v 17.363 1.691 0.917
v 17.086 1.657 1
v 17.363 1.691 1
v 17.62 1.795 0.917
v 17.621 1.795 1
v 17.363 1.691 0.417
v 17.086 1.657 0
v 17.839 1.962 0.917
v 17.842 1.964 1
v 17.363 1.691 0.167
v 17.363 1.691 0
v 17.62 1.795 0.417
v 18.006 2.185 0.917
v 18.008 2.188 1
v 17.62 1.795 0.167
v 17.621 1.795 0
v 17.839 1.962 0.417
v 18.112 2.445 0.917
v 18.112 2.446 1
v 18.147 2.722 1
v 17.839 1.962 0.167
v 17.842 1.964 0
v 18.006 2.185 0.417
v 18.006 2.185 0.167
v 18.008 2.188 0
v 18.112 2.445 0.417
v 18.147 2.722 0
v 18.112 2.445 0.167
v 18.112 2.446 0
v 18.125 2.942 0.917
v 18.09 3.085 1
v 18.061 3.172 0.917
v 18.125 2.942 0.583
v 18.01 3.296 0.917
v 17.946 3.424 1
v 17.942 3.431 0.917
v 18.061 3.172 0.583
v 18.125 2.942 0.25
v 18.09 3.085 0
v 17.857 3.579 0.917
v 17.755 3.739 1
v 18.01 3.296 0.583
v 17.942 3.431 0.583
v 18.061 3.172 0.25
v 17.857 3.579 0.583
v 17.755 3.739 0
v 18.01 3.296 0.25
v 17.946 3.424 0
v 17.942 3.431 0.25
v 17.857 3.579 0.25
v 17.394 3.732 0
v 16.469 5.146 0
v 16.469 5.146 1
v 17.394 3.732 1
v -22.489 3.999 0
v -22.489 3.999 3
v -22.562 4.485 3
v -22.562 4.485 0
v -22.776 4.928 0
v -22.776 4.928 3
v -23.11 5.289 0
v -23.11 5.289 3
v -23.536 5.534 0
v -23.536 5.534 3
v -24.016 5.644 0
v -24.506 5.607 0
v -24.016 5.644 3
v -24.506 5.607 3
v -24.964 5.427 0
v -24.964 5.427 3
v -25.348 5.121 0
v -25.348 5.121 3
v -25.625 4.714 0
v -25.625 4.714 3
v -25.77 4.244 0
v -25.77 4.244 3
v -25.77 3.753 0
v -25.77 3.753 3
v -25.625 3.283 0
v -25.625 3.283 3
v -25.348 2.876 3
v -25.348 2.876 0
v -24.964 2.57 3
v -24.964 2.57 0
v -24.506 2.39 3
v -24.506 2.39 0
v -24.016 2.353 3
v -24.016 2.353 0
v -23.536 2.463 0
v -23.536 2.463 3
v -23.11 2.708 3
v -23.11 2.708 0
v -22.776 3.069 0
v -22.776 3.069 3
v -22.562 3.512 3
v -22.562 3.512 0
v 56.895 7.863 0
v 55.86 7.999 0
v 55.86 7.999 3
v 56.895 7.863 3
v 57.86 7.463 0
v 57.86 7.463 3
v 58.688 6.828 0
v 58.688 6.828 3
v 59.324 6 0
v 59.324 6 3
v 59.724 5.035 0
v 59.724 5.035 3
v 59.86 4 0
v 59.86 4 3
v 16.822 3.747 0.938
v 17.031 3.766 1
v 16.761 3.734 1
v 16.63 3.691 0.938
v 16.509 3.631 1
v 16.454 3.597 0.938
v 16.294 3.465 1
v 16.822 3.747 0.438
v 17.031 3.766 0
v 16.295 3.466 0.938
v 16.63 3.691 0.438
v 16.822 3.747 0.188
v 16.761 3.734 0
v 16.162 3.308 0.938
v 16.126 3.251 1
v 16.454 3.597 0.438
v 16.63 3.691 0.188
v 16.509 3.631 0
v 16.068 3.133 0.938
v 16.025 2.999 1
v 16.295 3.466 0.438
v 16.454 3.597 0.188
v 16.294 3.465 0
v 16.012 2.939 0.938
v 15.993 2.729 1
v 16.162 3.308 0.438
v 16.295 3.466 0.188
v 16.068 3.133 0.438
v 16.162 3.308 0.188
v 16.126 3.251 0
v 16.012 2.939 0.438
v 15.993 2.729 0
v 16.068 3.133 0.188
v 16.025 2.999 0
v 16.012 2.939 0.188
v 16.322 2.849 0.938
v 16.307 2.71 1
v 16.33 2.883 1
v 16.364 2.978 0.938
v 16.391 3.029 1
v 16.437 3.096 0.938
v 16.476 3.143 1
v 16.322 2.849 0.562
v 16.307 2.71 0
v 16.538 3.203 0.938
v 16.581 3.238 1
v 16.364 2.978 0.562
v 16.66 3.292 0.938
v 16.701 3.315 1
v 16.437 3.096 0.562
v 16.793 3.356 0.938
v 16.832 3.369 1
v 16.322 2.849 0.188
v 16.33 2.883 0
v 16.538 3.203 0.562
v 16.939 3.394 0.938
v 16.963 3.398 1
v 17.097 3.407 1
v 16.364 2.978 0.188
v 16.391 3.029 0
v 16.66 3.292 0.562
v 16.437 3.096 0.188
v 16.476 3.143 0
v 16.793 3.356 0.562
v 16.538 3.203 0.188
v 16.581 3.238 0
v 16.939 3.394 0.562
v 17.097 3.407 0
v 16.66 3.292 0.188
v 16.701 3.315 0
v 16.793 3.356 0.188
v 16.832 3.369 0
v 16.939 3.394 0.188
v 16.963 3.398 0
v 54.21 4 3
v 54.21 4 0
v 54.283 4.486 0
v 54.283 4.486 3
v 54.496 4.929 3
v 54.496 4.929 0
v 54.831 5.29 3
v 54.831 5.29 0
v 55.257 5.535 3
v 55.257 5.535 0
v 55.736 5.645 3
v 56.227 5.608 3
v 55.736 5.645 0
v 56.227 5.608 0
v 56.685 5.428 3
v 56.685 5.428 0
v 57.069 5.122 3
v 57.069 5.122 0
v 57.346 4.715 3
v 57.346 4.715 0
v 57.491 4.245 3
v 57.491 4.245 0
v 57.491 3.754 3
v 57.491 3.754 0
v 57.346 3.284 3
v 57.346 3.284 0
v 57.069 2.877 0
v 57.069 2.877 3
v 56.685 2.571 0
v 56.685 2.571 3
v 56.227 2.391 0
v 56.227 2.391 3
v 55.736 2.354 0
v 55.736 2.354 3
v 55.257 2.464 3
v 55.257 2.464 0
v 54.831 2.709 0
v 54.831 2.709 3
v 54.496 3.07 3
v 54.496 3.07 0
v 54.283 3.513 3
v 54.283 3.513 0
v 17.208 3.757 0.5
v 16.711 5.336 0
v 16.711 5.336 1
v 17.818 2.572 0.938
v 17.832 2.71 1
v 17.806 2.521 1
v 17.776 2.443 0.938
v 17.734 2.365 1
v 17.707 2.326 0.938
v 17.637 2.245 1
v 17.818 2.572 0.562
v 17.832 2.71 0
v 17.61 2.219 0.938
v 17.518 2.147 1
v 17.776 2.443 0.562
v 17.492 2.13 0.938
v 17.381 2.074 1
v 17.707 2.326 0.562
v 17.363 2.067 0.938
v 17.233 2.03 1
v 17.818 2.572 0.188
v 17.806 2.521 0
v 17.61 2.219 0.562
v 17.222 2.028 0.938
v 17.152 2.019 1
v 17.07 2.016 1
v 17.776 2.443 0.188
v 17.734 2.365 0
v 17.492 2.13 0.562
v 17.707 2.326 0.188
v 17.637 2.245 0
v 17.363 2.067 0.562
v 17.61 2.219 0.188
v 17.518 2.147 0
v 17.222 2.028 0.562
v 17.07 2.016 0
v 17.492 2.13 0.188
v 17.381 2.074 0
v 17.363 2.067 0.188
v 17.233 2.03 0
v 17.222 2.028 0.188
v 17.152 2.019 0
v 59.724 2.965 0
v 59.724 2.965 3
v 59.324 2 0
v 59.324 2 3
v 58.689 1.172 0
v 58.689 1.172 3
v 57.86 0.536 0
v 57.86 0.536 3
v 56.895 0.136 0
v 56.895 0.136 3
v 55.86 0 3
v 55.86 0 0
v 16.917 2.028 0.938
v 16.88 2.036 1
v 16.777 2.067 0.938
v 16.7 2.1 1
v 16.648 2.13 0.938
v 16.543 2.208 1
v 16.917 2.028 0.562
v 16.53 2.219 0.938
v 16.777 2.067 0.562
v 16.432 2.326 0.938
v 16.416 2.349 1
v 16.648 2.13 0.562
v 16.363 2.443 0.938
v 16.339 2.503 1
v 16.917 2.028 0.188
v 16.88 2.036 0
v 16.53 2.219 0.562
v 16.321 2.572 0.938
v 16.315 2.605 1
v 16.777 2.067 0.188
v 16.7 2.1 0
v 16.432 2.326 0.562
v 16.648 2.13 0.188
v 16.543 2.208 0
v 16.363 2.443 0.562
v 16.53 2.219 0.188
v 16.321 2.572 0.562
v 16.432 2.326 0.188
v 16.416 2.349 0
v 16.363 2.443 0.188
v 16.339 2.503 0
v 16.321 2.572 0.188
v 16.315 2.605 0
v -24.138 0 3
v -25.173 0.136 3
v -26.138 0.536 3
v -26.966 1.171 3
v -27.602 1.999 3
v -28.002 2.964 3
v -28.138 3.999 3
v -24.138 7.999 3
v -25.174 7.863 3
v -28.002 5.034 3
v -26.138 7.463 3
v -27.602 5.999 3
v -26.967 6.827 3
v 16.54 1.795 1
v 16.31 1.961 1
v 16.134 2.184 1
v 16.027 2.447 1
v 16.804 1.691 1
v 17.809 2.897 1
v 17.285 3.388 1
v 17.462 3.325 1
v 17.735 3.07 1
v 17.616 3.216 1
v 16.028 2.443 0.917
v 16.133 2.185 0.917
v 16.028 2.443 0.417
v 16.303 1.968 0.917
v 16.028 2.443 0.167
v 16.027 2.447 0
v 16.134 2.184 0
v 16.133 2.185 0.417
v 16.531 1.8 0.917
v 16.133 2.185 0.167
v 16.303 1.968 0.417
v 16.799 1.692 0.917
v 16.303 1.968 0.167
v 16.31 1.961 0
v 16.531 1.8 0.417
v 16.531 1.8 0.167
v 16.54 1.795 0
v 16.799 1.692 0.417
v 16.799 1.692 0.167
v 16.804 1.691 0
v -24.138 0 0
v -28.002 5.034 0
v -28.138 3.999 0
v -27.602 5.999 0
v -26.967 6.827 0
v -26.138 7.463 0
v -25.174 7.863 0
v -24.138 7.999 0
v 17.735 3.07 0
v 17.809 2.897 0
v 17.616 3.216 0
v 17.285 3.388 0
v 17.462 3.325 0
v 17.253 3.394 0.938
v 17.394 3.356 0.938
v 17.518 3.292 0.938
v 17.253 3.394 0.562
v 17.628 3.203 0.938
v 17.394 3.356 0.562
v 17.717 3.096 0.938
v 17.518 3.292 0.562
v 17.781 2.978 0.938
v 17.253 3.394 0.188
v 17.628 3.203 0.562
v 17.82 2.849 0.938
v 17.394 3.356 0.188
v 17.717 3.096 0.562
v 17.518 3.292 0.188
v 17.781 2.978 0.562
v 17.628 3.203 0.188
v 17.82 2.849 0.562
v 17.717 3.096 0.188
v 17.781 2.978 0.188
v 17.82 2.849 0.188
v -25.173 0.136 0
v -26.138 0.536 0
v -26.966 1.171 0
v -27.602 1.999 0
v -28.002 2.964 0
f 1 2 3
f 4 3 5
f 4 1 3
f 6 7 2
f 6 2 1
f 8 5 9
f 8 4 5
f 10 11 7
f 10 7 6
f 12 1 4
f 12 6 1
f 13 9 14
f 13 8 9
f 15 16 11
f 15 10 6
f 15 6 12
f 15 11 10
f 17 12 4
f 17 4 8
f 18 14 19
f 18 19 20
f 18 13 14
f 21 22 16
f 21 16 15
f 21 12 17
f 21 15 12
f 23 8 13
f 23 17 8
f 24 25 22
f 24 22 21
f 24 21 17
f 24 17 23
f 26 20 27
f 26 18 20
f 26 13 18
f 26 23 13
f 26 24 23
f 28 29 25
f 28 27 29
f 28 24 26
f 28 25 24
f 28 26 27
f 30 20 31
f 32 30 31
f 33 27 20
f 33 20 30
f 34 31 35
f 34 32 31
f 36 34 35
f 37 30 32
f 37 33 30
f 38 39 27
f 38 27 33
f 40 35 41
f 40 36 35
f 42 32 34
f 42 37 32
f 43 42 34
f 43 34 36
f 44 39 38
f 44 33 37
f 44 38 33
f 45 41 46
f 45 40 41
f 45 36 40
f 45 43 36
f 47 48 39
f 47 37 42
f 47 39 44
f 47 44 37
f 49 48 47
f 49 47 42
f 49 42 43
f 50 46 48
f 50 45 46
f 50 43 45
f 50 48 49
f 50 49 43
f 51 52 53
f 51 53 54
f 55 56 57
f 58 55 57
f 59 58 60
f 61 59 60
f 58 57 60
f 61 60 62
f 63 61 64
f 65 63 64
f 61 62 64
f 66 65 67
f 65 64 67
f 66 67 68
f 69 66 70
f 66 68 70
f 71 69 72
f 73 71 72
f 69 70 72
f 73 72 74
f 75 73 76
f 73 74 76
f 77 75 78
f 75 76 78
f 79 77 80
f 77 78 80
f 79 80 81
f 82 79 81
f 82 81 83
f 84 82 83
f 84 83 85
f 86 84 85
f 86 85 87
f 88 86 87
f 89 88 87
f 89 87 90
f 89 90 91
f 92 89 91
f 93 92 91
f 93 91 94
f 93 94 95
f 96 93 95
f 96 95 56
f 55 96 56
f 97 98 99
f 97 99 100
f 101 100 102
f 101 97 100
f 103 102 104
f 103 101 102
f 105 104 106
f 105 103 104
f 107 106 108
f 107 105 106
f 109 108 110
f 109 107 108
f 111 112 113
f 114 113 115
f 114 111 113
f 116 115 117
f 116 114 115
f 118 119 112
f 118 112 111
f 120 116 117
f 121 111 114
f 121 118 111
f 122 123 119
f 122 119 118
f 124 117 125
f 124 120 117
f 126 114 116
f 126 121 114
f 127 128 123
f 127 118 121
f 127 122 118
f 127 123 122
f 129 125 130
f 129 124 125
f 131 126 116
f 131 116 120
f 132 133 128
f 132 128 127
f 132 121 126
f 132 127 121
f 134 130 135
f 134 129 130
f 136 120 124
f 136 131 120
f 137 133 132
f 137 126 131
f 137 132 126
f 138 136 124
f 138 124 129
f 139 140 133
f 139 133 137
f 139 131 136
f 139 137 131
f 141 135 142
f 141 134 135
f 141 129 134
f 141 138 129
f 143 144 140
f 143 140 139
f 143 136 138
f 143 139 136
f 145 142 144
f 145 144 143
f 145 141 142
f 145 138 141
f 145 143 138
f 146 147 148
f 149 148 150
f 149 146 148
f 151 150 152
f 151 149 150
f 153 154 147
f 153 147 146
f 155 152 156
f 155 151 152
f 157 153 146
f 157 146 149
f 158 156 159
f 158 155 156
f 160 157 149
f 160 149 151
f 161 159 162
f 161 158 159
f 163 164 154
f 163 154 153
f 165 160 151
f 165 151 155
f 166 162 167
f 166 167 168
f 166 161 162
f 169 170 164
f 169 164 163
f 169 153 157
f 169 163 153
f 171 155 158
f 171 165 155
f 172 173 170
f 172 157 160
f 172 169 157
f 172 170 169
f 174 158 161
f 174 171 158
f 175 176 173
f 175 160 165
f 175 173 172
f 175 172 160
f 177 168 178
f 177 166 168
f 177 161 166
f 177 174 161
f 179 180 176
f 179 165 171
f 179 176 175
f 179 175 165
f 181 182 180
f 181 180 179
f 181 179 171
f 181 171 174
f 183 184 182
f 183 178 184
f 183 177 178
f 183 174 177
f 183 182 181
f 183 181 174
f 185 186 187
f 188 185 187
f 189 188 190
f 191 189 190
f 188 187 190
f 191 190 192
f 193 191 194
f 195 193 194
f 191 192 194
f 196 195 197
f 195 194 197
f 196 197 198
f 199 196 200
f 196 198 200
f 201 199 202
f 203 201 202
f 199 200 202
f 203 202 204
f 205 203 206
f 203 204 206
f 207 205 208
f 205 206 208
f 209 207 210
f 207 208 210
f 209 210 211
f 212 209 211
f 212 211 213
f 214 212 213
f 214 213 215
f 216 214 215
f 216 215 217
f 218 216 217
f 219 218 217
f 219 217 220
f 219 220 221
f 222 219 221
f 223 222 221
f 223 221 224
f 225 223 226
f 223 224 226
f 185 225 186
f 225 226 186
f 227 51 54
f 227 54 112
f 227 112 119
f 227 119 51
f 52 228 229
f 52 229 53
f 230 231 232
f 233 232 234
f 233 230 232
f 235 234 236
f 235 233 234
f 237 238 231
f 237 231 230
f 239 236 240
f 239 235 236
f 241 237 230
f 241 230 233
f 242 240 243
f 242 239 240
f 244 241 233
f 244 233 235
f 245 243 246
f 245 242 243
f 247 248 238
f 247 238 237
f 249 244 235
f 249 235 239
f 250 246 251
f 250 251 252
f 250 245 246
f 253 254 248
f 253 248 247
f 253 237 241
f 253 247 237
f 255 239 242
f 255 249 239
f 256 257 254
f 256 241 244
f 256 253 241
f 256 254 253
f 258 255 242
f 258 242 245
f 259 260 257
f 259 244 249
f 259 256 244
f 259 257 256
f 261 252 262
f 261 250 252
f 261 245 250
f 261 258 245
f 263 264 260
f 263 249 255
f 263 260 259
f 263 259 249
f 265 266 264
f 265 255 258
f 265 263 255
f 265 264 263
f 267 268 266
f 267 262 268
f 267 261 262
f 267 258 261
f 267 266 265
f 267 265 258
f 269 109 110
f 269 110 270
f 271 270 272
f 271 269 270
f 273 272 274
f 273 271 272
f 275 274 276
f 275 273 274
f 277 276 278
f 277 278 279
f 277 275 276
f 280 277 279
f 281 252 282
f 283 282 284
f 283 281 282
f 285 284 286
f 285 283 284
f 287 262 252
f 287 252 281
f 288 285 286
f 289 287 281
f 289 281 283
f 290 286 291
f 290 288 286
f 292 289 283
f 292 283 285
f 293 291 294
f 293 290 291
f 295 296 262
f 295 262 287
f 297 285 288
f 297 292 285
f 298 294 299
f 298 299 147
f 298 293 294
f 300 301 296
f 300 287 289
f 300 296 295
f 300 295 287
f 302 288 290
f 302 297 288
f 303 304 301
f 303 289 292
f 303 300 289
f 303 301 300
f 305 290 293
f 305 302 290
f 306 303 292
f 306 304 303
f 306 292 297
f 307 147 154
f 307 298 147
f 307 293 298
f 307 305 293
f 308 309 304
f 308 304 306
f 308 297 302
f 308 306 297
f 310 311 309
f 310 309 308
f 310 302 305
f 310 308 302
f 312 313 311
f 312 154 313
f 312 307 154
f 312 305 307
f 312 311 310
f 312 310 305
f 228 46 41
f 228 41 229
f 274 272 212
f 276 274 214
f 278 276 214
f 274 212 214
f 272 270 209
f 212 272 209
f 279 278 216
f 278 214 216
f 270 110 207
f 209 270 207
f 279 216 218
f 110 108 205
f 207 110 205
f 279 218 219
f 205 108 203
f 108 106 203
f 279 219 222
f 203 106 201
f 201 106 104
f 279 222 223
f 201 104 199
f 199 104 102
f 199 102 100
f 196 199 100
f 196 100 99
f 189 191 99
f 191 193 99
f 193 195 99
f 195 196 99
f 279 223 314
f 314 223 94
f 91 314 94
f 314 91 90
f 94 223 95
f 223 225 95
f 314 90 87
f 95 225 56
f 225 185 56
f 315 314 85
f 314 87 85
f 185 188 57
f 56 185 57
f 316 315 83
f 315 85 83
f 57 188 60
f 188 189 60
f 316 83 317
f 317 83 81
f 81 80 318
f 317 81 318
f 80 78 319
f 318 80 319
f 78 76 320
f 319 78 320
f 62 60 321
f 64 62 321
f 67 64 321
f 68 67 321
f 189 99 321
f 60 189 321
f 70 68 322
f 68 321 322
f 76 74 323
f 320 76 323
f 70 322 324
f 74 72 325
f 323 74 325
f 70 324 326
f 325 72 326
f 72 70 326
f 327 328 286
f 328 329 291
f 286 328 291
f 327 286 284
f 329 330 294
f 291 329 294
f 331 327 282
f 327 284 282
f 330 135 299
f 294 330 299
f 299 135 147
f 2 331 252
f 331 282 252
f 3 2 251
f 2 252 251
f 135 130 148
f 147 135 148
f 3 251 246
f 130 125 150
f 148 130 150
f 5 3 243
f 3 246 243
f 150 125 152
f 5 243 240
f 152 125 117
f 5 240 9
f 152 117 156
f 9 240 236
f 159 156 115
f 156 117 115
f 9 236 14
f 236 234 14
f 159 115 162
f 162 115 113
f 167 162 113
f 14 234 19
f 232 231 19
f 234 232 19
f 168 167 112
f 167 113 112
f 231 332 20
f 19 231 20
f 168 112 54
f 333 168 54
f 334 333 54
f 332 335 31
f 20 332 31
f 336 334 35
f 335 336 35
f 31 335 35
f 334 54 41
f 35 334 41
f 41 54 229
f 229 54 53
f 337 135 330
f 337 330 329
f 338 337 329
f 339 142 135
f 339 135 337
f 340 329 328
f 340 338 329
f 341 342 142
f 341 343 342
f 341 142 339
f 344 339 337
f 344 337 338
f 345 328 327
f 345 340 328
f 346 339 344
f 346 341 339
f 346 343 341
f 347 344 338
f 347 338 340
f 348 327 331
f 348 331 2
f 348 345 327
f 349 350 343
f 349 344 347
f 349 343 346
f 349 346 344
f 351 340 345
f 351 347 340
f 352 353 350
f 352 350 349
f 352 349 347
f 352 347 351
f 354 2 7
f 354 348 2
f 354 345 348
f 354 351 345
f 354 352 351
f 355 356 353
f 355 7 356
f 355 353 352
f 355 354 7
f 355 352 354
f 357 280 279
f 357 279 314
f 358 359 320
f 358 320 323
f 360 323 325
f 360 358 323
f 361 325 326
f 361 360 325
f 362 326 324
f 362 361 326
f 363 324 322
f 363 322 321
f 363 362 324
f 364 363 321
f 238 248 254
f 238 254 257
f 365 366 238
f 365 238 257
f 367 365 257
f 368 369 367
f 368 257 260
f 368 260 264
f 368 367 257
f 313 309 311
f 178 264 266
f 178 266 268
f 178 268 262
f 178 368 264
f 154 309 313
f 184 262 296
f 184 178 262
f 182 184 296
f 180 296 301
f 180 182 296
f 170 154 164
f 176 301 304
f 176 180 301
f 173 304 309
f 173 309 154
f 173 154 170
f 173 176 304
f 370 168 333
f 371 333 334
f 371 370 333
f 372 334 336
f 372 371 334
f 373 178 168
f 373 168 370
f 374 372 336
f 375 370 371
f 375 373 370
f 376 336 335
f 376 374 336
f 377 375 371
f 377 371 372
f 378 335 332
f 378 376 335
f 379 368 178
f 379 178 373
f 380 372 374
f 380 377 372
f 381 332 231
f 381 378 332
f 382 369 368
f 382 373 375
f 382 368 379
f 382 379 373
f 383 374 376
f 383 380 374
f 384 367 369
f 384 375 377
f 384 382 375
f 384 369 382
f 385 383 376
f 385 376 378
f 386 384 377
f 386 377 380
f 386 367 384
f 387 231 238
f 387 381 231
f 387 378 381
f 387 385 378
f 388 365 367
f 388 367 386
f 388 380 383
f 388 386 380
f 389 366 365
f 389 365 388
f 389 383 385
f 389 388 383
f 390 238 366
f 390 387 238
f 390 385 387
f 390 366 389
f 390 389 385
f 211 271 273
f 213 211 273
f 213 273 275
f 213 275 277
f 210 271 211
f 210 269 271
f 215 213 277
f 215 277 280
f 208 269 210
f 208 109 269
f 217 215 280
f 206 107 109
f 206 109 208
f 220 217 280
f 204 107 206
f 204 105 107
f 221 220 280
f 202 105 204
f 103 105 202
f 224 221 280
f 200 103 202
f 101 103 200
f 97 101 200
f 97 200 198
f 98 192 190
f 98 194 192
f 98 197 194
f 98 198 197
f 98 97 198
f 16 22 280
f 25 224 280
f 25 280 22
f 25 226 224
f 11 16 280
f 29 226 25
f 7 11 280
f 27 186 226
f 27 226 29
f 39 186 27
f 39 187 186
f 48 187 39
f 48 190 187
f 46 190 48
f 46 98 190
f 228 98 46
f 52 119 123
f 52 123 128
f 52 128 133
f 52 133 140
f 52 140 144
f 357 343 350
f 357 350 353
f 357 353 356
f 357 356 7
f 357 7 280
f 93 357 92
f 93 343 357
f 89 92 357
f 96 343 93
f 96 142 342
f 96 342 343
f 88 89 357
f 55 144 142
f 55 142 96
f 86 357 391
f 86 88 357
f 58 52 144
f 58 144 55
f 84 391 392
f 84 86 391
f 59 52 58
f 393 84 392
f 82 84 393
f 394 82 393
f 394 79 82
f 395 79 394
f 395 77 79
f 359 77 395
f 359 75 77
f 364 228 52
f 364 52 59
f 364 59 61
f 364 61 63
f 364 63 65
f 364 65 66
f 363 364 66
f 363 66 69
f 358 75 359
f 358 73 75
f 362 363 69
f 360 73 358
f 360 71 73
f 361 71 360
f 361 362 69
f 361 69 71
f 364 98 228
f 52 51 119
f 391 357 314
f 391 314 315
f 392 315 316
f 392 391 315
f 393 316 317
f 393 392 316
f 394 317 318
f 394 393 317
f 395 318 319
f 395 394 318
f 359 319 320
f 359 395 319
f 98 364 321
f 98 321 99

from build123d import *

# Parameters (mm, degrees)
SKETCH_1_R          = 1.3
SKETCH_1_R_2        = 1.65
EXTRUDE_1_DEPTH     = 3
SKETCH_2_R          = 1.65
CUT_EXTRUDE_1_DEPTH = 61.466769186
CUT_EXTRUDE_2_DEPTH = 1


with BuildPart() as part:
    # 草图1 → 凸台-拉伸1 (new body)
    with BuildSketch(Plane(origin=(0, 0, 0), x_dir=(-1, 0, 0), z_dir=(0, 0, -1))):
        with BuildLine():
            Line((-55.860221974, 0), (24.13832066, 0))
            ThreePointArc((24.13832066, 0), (26.966394209, 1.171219344), (28.138320535, 3.999))
            ThreePointArc((28.138320535, 3.999), (26.96674766, 6.827427125), (24.138320535, 7.999))
            Line((24.138320535, 7.999), (-55.860222099, 7.999))
            ThreePointArc((-55.860222099, 7.999), (-58.688295648, 6.827780656), (-59.860221974, 4))
            ThreePointArc((-59.860221974, 4), (-58.688649099, 1.171572875), (-55.860221974, 0))
        make_face()
        with Locations((24.138809001, 3.998511534)):
            Circle(SKETCH_1_R, mode=Mode.SUBTRACT)
        with Locations((-55.859733508, 3.999511534)):
            Circle(SKETCH_1_R_2, mode=Mode.SUBTRACT)
    extrude(amount=-EXTRUDE_1_DEPTH)

    # 草图2 → 切除-拉伸1 (cut, through all)
    with BuildSketch(Plane.XY.offset(3)):
        with Locations((-24.138809001, 3.998511534)):
            Circle(SKETCH_2_R)
    extrude(amount=-CUT_EXTRUDE_1_DEPTH, mode=Mode.SUBTRACT)

    # 草图3 → 切除-拉伸2 (cut)
    with BuildSketch(Plane(origin=(0, 0, 0), x_dir=(-1, 0, 0), z_dir=(0, 0, -1))):
        with BuildLine():
            Line((-16.710668713, 5.336154662), (-16.468781693, 5.146150656))
            Line((-16.468781693, 5.146150656), (-17.393561341, 3.731987996))
            add(Edge.make_bspline(
                [(-17.393561341, 3.731987996), (-17.331991064, 3.741801856), (-17.211891277, 3.760944901), (-17.090325379, 3.764102847), (-17.031081373, 3.765641842)],
                knots=[0, 0, 0, 0, 1.025318673, 2, 2, 2, 2], degree=3))
            add(Edge.make_bspline(
                [(-17.031081373, 3.765641842), (-16.995508877, 3.76468573), (-16.925485476, 3.762803653), (-16.822678674, 3.748319802), (-16.723889738, 3.72549469), (-16.629528126, 3.692222434), (-16.539255144, 3.64972008), (-16.452552748, 3.59878121), (-16.371050738, 3.536775529), (-16.293699558, 3.467510573), (-16.223472461, 3.390793589), (-16.161296405, 3.309392252), (-16.109069614, 3.223391371), (-16.066695692, 3.132834505), (-16.033790813, 3.037861246), (-16.009803168, 2.938593106), (-15.995623576, 2.834961635), (-15.993698085, 2.76448346), (-15.992719995, 2.728682707)],
                knots=[0, 0, 0, 0, 1.04369286, 2.054478336, 3.041073146, 4.015093852, 4.984733326, 5.965804835, 6.960378782, 7.985147595, 9.009457201, 10.008161701, 10.986880575, 11.956520048, 12.937015923, 13.931873656, 14.949455224, 16, 16, 16, 16], degree=3))
            add(Edge.make_bspline(
                [(-15.992719995, 2.728682707), (-15.9941431, 2.679703003), (-15.996943433, 2.583322537), (-16.024847229, 2.442945831), (-16.068206874, 2.309213315), (-16.130184402, 2.184260144), (-16.207166785, 2.068257574), (-16.301044378, 1.965472109), (-16.408487866, 1.873802072), (-16.529974665, 1.797145453), (-16.660717629, 1.734542402), (-16.798069626, 1.689577159), (-16.940696772, 1.66189369), (-17.03750138, 1.658423087), (-17.086469995, 1.656667483)],
                knots=[0, 0, 0, 0, 1.031375318, 2.029502543, 3.004789286, 3.987476834, 4.960371455, 5.9300674, 6.912260825, 7.929083631, 8.949397511, 9.960523116, 10.96833055, 12, 12, 12, 12], degree=3))
            add(Edge.make_bspline(
                [(-17.086469995, 1.656667483), (-17.133566695, 1.658195689), (-17.226857013, 1.661222797), (-17.364089808, 1.688188735), (-17.495952825, 1.731895837), (-17.621522206, 1.792110116), (-17.737842819, 1.868167999), (-17.841908455, 1.959730278), (-17.93320023, 2.064839743), (-18.009174851, 2.18348009), (-18.069433583, 2.310970048), (-18.114623508, 2.443907204), (-18.141019751, 2.581807186), (-18.144708308, 2.675288325), (-18.146566149, 2.722372611)],
                knots=[0, 0, 0, 0, 1.012016664, 2.004627821, 2.994792927, 3.992885782, 4.990978636, 5.973936114, 6.964471063, 7.975201453, 8.993600317, 9.990122807, 10.98767138, 12, 12, 12, 12], degree=3))
            add(Edge.make_bspline(
                [(-18.146566149, 2.722372611), (-18.145384704, 2.758417194), (-18.142972419, 2.832013346), (-18.126129028, 2.943477374), (-18.099064233, 3.057528456), (-18.068753987, 3.15428265), (-18.036728377, 3.233544172), (-18.010075837, 3.297447662), (-17.976901841, 3.363208735), (-17.94152846, 3.433082371), (-17.900771591, 3.505267804), (-17.856455942, 3.580971474), (-17.807356291, 3.658989401), (-17.772936128, 3.711933596), (-17.755340187, 3.738999214)],
                knots=[0, 0, 0, 0, 1.173818275, 2.396712641, 3.66331629, 4.989737886, 5.693666774, 6.447286557, 7.243889047, 8.091586357, 8.998013824, 9.943181721, 10.948533338, 12, 12, 12, 12], degree=3))
            Line((-17.755340187, 3.738999214), (-16.710668713, 5.336154662))
        make_face()
        with BuildLine():
            add(Edge.make_bspline(
                [(-17.096986822, 3.406667483), (-17.123649066, 3.405889439), (-17.175728176, 3.404369694), (-17.252135591, 3.395544442), (-17.324448842, 3.378925376), (-17.393625976, 3.357759044), (-17.458373679, 3.328655985), (-17.519162518, 3.293304186), (-17.57622757, 3.251683008), (-17.628971122, 3.204382096), (-17.676790785, 3.152594064), (-17.717971916, 3.097124541), (-17.753494316, 3.039310338), (-17.782376135, 2.978668396), (-17.804866211, 2.915221896), (-17.821134462, 2.849262647), (-17.830188213, 2.780348341), (-17.831694444, 2.733615838), (-17.832463584, 2.709752419)],
                knots=[0, 0, 0, 0, 1.129588631, 2.206414736, 3.251139165, 4.268635594, 5.265702196, 6.250456724, 7.242448911, 8.251968645, 9.246821453, 10.222880186, 11.173611482, 12.116736599, 13.062300278, 14.020270554, 14.989073742, 16, 16, 16, 16], degree=3))
            add(Edge.make_bspline(
                [(-17.832463584, 2.709752419), (-17.831837223, 2.686102439), (-17.830609021, 2.639728349), (-17.819456701, 2.57138917), (-17.802421619, 2.505624261), (-17.777081223, 2.442772662), (-17.746854335, 2.381876344), (-17.706949011, 2.325141059), (-17.662732225, 2.269120989), (-17.609878292, 2.218119517), (-17.553154929, 2.170662893), (-17.492553726, 2.12918264), (-17.429393766, 2.093696466), (-17.362822344, 2.065885369), (-17.29378396, 2.043061082), (-17.221703406, 2.026999603), (-17.146530551, 2.017919077), (-17.095608613, 2.016410883), (-17.069643072, 2.015641842)],
                knots=[0, 0, 0, 0, 0.989467248, 1.94019797, 2.891935182, 3.827694429, 4.772920941, 5.730924762, 6.725747692, 7.756678648, 8.79901574, 9.819492441, 10.826891316, 11.826466727, 12.835195252, 13.867842842, 14.912794438, 16, 16, 16, 16], degree=3))
            add(Edge.make_bspline(
                [(-17.069643072, 2.015641842), (-17.043677573, 2.016410943), (-16.992755718, 2.017919255), (-16.917582258, 2.026998924), (-16.84550394, 2.043063572), (-16.776457431, 2.065876342), (-16.709916, 2.093729952), (-16.646811278, 2.128961871), (-16.586783185, 2.170917989), (-16.530022585, 2.218038417), (-16.477388647, 2.269411269), (-16.432111368, 2.324640992), (-16.393428135, 2.382334887), (-16.361993948, 2.442532777), (-16.336932657, 2.505662265), (-16.319811189, 2.571378989), (-16.3086819, 2.639731015), (-16.307450534, 2.686103339), (-16.306822559, 2.709752419)],
                knots=[0, 0, 0, 0, 1.087397944, 2.132534446, 3.165364764, 4.174271784, 5.174024072, 6.181601208, 7.194203697, 8.236725232, 9.267838612, 10.269026844, 11.221737037, 12.171628256, 13.107553087, 14.05945871, 15.010357665, 16, 16, 16, 16], degree=3))
            add(Edge.make_bspline(
                [(-16.306822559, 2.709752419), (-16.307372852, 2.73364697), (-16.308452898, 2.780544202), (-16.320668847, 2.84923182), (-16.33761122, 2.915557027), (-16.363194251, 2.979102976), (-16.396430796, 3.039618903), (-16.436914203, 3.097410504), (-16.483746773, 3.152920851), (-16.537844313, 3.20448366), (-16.596734547, 3.251630737), (-16.659350132, 3.293250294), (-16.724858106, 3.328375271), (-16.793192048, 3.357682373), (-16.865134931, 3.378831847), (-16.93952527, 3.39548509), (-17.017314513, 3.404347108), (-17.070091121, 3.405884173), (-17.096986822, 3.406667483)],
                knots=[0, 0, 0, 0, 0.978206639, 1.919901502, 2.851605144, 3.780102724, 4.718870031, 5.675451981, 6.667674623, 7.690630536, 8.733308323, 9.756129687, 10.767539656, 11.776269907, 12.797430371, 13.836405707, 14.897401972, 16, 16, 16, 16], degree=3))
        make_face(mode=Mode.SUBTRACT)
    extrude(amount=-CUT_EXTRUDE_2_DEPTH, mode=Mode.SUBTRACT)


solid = part.part
